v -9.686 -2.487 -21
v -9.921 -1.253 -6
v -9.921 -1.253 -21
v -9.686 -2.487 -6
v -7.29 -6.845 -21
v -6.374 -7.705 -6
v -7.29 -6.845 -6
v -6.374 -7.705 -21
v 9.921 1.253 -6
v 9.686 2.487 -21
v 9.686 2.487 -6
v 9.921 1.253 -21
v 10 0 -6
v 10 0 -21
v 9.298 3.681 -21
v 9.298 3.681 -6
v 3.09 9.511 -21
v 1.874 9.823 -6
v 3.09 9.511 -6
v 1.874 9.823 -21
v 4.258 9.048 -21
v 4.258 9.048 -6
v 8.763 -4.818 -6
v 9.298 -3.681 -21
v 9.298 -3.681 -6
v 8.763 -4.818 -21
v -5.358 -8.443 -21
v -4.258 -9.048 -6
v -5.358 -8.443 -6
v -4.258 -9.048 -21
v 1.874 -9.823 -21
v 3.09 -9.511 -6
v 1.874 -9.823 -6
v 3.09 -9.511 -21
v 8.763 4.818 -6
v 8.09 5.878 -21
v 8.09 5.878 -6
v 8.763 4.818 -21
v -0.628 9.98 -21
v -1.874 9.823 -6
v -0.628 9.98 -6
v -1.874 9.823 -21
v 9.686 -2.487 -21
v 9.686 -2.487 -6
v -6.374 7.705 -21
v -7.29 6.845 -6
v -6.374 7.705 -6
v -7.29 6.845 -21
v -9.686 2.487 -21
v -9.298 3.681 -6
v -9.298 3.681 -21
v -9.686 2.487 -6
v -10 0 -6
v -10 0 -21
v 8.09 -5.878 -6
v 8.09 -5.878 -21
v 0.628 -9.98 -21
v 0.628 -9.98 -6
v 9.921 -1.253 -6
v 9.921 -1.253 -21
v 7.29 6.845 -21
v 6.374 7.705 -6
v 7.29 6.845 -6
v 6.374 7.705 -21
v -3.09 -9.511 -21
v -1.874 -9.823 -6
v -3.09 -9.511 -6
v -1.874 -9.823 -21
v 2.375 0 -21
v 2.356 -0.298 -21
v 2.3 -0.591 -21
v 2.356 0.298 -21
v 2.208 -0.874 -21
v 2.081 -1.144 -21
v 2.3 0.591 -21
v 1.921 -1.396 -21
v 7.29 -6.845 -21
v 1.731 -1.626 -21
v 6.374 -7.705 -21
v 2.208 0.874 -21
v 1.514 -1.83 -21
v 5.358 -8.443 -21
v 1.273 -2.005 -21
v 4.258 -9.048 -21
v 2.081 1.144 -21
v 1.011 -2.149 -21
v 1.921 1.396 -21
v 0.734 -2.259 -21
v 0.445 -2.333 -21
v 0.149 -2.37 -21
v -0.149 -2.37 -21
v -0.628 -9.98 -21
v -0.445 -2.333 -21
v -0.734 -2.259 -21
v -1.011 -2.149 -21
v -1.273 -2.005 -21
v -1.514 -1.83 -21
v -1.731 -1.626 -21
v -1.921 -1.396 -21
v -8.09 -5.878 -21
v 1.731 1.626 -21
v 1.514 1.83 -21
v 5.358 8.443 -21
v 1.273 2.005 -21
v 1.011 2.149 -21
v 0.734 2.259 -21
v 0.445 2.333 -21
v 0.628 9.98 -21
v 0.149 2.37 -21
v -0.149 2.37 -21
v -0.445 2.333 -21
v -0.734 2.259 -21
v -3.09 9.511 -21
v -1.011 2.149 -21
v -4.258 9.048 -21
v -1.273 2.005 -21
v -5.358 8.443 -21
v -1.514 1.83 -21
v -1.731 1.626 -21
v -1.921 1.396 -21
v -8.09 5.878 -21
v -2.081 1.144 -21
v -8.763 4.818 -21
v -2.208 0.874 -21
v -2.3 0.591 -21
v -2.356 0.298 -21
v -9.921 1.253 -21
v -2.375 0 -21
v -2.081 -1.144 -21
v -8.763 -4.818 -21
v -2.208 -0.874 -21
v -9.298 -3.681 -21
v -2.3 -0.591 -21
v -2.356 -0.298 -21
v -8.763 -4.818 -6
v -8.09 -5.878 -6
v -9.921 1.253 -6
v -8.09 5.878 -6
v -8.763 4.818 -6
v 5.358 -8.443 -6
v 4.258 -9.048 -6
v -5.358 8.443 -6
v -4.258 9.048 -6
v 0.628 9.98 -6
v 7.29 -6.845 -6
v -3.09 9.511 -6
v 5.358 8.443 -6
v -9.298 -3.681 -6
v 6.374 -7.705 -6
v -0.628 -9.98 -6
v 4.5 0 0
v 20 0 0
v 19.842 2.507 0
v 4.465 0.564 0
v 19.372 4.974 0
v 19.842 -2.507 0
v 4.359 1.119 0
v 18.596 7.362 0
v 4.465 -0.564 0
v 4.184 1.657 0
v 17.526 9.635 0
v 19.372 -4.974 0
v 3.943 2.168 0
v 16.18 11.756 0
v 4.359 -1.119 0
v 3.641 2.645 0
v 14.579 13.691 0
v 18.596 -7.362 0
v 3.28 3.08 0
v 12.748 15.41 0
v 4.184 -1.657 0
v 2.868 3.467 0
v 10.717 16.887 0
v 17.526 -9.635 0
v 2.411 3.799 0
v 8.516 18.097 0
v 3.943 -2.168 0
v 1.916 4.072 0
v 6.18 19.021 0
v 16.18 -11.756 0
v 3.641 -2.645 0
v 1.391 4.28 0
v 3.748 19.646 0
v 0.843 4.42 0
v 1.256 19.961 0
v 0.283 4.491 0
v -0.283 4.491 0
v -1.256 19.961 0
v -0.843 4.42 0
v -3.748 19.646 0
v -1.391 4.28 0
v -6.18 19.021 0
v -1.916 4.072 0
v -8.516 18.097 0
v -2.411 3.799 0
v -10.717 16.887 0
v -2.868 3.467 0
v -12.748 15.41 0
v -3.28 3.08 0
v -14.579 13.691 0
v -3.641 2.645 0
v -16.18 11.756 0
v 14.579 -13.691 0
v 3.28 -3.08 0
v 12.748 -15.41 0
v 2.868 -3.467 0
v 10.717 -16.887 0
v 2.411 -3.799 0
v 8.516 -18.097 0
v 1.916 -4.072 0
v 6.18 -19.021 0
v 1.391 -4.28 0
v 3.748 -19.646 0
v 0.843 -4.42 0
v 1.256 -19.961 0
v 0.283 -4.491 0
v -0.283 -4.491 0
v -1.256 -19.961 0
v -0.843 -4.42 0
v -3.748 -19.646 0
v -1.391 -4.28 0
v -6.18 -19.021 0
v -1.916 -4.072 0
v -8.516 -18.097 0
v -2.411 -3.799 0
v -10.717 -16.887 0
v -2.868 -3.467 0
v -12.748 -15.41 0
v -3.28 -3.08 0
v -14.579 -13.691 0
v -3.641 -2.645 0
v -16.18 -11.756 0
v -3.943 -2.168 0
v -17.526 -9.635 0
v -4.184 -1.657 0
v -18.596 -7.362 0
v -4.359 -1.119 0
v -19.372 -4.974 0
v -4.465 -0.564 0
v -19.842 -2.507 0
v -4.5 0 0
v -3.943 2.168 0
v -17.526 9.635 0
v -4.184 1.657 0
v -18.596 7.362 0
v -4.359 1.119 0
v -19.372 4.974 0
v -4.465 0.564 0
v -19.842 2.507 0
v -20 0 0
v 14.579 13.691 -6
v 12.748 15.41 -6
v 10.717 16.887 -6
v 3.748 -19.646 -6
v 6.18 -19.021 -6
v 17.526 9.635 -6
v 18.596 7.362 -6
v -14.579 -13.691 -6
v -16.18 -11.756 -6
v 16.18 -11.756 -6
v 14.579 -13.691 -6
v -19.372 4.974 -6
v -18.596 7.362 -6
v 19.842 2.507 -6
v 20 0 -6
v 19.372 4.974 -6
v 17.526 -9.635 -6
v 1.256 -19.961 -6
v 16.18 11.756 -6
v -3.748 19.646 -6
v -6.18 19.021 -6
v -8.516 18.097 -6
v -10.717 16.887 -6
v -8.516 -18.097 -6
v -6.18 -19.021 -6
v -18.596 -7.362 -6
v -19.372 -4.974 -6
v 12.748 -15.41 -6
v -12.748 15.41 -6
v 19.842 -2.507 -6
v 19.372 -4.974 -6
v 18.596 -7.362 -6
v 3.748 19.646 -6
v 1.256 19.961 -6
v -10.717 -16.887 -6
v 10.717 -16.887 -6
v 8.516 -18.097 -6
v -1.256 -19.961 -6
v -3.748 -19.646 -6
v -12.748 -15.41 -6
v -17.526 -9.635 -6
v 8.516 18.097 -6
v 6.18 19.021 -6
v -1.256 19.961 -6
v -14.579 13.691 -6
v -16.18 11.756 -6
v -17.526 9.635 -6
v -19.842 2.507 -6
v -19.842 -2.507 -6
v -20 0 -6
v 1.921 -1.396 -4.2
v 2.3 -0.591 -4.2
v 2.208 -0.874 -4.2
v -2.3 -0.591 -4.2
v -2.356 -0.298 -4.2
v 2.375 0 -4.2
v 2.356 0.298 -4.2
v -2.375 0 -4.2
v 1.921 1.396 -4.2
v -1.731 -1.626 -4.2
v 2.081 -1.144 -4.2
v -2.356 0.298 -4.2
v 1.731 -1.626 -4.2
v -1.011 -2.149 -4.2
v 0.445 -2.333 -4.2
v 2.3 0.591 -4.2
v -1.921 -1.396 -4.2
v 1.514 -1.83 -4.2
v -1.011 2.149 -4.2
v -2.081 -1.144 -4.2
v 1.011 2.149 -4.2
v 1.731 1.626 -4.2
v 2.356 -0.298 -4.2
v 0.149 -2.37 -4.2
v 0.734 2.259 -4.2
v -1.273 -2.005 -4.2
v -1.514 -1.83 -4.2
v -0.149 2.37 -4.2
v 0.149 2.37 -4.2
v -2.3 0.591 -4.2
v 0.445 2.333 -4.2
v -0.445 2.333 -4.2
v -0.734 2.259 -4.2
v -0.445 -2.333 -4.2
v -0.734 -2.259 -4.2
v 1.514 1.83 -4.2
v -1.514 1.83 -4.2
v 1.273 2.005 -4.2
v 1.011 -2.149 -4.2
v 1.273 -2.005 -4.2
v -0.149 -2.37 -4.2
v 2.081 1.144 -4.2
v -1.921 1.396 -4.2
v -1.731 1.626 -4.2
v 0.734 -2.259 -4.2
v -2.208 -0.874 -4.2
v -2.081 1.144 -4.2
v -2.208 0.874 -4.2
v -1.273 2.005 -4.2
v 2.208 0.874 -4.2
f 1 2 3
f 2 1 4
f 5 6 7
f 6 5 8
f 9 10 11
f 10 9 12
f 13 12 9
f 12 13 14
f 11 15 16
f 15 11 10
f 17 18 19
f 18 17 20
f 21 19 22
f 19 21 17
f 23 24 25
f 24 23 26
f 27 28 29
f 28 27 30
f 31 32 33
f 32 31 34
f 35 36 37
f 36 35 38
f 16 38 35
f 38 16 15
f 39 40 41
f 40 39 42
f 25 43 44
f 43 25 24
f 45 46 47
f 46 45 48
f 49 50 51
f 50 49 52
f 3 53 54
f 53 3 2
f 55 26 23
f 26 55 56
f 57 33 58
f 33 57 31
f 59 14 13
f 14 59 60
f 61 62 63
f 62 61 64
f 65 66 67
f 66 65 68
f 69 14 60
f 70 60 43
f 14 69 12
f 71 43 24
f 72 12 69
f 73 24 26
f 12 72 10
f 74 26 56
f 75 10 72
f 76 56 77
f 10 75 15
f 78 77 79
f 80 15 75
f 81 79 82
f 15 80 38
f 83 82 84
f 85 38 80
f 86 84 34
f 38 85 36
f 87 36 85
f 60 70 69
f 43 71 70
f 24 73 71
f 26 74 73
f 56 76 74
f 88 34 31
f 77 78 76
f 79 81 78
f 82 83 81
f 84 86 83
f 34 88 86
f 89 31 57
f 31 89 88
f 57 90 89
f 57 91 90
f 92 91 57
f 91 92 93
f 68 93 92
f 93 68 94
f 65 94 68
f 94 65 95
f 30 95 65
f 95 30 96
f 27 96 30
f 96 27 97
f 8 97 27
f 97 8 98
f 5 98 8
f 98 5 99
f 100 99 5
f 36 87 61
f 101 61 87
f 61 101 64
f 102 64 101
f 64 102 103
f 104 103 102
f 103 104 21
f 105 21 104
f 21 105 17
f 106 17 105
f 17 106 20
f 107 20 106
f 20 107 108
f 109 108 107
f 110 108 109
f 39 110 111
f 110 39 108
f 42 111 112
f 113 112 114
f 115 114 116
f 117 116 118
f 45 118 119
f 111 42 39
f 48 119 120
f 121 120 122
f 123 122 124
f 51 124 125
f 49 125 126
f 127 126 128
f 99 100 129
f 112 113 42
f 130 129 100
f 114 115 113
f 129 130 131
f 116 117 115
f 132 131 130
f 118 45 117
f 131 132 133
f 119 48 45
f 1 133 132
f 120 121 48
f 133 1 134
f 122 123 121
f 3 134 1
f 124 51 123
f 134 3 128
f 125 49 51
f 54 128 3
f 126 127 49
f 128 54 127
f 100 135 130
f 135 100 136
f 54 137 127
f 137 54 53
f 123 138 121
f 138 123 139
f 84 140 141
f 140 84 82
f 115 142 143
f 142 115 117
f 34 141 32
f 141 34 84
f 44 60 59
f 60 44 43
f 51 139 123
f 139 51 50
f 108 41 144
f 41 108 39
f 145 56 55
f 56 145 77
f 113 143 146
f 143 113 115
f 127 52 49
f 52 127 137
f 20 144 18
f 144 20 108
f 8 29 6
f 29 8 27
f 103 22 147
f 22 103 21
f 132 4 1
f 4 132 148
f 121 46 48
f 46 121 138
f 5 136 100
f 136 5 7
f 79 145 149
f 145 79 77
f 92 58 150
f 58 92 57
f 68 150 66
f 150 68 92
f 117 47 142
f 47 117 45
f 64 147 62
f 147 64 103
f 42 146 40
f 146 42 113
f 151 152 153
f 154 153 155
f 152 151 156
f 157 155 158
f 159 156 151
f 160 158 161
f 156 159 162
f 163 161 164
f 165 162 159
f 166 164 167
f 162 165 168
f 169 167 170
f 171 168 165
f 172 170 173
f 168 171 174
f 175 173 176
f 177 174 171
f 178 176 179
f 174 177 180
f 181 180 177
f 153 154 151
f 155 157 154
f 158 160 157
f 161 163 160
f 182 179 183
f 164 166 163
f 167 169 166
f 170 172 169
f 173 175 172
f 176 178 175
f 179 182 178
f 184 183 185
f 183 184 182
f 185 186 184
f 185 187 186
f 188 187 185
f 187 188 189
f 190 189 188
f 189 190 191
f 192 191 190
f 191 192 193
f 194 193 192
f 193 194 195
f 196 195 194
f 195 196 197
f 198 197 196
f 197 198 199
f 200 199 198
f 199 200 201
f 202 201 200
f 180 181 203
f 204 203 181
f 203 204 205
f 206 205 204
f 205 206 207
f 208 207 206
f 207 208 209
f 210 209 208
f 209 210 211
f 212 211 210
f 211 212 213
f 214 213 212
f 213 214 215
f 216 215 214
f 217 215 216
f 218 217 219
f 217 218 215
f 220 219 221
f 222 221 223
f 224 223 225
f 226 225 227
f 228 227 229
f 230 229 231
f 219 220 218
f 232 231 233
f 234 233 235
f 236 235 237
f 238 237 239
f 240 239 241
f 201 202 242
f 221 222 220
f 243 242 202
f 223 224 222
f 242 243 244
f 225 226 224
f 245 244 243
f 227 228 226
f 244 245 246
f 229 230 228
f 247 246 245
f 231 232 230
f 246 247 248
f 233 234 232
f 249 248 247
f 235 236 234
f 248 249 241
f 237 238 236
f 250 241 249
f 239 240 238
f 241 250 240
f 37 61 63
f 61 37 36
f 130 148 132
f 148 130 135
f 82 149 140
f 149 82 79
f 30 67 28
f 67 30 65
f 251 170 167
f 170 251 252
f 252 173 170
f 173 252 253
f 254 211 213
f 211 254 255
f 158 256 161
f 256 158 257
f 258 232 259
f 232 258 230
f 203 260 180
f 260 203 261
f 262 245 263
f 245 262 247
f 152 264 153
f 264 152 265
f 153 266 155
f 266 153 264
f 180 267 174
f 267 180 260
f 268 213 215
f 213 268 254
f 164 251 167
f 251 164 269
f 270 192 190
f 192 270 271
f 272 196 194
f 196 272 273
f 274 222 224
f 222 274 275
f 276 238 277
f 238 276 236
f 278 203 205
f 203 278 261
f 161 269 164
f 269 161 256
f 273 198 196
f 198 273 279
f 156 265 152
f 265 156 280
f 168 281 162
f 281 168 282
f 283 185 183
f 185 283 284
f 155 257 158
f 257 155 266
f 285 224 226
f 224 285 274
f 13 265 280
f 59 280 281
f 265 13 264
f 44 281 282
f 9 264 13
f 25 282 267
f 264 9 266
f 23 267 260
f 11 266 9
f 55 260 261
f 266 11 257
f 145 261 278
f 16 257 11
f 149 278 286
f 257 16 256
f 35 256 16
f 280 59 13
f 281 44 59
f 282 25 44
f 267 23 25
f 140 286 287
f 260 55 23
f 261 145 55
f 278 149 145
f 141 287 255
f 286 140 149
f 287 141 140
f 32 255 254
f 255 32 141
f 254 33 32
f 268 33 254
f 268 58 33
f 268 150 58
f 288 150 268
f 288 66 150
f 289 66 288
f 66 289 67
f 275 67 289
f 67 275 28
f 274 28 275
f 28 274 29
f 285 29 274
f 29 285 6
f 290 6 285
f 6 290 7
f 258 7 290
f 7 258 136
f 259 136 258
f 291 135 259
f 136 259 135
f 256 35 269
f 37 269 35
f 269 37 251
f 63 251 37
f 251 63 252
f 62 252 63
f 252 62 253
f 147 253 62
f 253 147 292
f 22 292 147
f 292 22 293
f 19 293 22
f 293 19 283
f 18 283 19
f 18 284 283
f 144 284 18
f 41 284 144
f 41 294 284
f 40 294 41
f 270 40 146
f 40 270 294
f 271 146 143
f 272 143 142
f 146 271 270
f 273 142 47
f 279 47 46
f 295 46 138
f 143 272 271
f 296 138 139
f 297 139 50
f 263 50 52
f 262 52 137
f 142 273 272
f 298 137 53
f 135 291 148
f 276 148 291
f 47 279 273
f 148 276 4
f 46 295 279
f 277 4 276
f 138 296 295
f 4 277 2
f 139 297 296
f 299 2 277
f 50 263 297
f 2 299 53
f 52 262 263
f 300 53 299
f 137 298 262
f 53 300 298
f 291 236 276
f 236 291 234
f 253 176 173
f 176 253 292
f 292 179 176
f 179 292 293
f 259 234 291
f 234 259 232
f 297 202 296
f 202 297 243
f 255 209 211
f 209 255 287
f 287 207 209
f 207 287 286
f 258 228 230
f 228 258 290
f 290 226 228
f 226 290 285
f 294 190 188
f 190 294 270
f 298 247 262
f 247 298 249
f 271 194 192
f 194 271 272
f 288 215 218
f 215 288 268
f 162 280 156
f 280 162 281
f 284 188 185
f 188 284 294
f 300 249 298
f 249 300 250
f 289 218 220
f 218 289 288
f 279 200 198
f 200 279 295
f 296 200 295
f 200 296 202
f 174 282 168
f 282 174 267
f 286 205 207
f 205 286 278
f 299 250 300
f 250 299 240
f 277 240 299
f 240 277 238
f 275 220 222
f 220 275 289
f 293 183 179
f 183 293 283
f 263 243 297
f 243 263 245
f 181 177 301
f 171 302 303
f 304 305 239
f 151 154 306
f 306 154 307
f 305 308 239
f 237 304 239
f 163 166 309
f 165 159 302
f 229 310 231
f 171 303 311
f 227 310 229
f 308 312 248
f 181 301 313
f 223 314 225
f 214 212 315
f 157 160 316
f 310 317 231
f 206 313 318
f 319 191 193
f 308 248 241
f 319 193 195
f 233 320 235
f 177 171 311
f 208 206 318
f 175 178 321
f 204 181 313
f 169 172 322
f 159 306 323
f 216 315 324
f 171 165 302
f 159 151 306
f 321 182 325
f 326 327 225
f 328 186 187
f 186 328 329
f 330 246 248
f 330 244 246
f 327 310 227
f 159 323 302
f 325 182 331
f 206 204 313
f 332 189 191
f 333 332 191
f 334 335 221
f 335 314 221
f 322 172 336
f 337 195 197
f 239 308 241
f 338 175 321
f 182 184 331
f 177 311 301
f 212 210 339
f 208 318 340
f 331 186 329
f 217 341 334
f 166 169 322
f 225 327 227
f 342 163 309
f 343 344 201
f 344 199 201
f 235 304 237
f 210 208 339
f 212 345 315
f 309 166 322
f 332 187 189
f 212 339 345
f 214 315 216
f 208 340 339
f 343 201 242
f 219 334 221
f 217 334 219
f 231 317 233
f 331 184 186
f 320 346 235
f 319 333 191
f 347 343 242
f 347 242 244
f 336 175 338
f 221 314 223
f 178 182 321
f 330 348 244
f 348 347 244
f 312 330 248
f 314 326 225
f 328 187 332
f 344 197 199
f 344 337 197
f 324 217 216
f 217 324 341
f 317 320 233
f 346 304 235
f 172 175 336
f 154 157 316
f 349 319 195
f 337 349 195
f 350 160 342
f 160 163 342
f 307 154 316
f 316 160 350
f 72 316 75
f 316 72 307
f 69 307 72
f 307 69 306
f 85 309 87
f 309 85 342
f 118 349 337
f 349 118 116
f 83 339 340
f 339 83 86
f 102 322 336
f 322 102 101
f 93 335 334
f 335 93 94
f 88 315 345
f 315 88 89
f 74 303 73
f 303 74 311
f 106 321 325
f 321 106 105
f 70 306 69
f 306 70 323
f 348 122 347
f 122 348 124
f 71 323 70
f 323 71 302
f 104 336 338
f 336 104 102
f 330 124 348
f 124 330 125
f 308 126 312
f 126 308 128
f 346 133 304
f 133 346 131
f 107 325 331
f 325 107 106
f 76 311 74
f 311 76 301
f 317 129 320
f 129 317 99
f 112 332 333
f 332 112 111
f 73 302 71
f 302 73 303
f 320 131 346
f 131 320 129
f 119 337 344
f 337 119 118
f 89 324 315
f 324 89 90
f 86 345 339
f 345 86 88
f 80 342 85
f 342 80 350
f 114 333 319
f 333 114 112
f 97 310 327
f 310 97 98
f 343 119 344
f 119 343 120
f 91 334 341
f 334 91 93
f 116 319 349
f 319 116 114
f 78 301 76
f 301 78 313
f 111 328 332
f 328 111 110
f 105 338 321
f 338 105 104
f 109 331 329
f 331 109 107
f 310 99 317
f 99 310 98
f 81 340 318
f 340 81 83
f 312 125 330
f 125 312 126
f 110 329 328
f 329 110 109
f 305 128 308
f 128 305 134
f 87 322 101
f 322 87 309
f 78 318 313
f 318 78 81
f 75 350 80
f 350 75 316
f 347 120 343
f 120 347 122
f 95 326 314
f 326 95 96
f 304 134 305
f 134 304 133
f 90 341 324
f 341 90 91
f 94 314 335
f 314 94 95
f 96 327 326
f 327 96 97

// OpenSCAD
$fn = 50;


difference() {
	union() {
		translate(v = [0, 0, -21.0000000000]) {
			cylinder(h = 21, r = 10.0000000000);
		}
		translate(v = [0, 0, -6.0000000000]) {
			cylinder(h = 6, r = 20.0000000000);
		}
	}
	union() {
		translate(v = [0, 0, 0]) {
			rotate(a = [0, 0, 0]) {
				difference() {
					union() {
						#translate(v = [0, 0, -21.0000000000]) {
							cylinder(h = 21, r = 2.2500000000);
						}
						#translate(v = [0, 0, -4.2000000000]) {
							cylinder(h = 4.2000000000, r1 = 2.3750000000, r2 = 4.5000000000);
						}
						#translate(v = [0, 0, -21.0000000000]) {
							cylinder(h = 21, r = 2.3750000000);
						}
						#translate(v = [0, 0, -21.0000000000]) {
							cylinder(h = 21, r = 2.2500000000);
						}
					}
					union();
				}
			}
		}
	}
}
